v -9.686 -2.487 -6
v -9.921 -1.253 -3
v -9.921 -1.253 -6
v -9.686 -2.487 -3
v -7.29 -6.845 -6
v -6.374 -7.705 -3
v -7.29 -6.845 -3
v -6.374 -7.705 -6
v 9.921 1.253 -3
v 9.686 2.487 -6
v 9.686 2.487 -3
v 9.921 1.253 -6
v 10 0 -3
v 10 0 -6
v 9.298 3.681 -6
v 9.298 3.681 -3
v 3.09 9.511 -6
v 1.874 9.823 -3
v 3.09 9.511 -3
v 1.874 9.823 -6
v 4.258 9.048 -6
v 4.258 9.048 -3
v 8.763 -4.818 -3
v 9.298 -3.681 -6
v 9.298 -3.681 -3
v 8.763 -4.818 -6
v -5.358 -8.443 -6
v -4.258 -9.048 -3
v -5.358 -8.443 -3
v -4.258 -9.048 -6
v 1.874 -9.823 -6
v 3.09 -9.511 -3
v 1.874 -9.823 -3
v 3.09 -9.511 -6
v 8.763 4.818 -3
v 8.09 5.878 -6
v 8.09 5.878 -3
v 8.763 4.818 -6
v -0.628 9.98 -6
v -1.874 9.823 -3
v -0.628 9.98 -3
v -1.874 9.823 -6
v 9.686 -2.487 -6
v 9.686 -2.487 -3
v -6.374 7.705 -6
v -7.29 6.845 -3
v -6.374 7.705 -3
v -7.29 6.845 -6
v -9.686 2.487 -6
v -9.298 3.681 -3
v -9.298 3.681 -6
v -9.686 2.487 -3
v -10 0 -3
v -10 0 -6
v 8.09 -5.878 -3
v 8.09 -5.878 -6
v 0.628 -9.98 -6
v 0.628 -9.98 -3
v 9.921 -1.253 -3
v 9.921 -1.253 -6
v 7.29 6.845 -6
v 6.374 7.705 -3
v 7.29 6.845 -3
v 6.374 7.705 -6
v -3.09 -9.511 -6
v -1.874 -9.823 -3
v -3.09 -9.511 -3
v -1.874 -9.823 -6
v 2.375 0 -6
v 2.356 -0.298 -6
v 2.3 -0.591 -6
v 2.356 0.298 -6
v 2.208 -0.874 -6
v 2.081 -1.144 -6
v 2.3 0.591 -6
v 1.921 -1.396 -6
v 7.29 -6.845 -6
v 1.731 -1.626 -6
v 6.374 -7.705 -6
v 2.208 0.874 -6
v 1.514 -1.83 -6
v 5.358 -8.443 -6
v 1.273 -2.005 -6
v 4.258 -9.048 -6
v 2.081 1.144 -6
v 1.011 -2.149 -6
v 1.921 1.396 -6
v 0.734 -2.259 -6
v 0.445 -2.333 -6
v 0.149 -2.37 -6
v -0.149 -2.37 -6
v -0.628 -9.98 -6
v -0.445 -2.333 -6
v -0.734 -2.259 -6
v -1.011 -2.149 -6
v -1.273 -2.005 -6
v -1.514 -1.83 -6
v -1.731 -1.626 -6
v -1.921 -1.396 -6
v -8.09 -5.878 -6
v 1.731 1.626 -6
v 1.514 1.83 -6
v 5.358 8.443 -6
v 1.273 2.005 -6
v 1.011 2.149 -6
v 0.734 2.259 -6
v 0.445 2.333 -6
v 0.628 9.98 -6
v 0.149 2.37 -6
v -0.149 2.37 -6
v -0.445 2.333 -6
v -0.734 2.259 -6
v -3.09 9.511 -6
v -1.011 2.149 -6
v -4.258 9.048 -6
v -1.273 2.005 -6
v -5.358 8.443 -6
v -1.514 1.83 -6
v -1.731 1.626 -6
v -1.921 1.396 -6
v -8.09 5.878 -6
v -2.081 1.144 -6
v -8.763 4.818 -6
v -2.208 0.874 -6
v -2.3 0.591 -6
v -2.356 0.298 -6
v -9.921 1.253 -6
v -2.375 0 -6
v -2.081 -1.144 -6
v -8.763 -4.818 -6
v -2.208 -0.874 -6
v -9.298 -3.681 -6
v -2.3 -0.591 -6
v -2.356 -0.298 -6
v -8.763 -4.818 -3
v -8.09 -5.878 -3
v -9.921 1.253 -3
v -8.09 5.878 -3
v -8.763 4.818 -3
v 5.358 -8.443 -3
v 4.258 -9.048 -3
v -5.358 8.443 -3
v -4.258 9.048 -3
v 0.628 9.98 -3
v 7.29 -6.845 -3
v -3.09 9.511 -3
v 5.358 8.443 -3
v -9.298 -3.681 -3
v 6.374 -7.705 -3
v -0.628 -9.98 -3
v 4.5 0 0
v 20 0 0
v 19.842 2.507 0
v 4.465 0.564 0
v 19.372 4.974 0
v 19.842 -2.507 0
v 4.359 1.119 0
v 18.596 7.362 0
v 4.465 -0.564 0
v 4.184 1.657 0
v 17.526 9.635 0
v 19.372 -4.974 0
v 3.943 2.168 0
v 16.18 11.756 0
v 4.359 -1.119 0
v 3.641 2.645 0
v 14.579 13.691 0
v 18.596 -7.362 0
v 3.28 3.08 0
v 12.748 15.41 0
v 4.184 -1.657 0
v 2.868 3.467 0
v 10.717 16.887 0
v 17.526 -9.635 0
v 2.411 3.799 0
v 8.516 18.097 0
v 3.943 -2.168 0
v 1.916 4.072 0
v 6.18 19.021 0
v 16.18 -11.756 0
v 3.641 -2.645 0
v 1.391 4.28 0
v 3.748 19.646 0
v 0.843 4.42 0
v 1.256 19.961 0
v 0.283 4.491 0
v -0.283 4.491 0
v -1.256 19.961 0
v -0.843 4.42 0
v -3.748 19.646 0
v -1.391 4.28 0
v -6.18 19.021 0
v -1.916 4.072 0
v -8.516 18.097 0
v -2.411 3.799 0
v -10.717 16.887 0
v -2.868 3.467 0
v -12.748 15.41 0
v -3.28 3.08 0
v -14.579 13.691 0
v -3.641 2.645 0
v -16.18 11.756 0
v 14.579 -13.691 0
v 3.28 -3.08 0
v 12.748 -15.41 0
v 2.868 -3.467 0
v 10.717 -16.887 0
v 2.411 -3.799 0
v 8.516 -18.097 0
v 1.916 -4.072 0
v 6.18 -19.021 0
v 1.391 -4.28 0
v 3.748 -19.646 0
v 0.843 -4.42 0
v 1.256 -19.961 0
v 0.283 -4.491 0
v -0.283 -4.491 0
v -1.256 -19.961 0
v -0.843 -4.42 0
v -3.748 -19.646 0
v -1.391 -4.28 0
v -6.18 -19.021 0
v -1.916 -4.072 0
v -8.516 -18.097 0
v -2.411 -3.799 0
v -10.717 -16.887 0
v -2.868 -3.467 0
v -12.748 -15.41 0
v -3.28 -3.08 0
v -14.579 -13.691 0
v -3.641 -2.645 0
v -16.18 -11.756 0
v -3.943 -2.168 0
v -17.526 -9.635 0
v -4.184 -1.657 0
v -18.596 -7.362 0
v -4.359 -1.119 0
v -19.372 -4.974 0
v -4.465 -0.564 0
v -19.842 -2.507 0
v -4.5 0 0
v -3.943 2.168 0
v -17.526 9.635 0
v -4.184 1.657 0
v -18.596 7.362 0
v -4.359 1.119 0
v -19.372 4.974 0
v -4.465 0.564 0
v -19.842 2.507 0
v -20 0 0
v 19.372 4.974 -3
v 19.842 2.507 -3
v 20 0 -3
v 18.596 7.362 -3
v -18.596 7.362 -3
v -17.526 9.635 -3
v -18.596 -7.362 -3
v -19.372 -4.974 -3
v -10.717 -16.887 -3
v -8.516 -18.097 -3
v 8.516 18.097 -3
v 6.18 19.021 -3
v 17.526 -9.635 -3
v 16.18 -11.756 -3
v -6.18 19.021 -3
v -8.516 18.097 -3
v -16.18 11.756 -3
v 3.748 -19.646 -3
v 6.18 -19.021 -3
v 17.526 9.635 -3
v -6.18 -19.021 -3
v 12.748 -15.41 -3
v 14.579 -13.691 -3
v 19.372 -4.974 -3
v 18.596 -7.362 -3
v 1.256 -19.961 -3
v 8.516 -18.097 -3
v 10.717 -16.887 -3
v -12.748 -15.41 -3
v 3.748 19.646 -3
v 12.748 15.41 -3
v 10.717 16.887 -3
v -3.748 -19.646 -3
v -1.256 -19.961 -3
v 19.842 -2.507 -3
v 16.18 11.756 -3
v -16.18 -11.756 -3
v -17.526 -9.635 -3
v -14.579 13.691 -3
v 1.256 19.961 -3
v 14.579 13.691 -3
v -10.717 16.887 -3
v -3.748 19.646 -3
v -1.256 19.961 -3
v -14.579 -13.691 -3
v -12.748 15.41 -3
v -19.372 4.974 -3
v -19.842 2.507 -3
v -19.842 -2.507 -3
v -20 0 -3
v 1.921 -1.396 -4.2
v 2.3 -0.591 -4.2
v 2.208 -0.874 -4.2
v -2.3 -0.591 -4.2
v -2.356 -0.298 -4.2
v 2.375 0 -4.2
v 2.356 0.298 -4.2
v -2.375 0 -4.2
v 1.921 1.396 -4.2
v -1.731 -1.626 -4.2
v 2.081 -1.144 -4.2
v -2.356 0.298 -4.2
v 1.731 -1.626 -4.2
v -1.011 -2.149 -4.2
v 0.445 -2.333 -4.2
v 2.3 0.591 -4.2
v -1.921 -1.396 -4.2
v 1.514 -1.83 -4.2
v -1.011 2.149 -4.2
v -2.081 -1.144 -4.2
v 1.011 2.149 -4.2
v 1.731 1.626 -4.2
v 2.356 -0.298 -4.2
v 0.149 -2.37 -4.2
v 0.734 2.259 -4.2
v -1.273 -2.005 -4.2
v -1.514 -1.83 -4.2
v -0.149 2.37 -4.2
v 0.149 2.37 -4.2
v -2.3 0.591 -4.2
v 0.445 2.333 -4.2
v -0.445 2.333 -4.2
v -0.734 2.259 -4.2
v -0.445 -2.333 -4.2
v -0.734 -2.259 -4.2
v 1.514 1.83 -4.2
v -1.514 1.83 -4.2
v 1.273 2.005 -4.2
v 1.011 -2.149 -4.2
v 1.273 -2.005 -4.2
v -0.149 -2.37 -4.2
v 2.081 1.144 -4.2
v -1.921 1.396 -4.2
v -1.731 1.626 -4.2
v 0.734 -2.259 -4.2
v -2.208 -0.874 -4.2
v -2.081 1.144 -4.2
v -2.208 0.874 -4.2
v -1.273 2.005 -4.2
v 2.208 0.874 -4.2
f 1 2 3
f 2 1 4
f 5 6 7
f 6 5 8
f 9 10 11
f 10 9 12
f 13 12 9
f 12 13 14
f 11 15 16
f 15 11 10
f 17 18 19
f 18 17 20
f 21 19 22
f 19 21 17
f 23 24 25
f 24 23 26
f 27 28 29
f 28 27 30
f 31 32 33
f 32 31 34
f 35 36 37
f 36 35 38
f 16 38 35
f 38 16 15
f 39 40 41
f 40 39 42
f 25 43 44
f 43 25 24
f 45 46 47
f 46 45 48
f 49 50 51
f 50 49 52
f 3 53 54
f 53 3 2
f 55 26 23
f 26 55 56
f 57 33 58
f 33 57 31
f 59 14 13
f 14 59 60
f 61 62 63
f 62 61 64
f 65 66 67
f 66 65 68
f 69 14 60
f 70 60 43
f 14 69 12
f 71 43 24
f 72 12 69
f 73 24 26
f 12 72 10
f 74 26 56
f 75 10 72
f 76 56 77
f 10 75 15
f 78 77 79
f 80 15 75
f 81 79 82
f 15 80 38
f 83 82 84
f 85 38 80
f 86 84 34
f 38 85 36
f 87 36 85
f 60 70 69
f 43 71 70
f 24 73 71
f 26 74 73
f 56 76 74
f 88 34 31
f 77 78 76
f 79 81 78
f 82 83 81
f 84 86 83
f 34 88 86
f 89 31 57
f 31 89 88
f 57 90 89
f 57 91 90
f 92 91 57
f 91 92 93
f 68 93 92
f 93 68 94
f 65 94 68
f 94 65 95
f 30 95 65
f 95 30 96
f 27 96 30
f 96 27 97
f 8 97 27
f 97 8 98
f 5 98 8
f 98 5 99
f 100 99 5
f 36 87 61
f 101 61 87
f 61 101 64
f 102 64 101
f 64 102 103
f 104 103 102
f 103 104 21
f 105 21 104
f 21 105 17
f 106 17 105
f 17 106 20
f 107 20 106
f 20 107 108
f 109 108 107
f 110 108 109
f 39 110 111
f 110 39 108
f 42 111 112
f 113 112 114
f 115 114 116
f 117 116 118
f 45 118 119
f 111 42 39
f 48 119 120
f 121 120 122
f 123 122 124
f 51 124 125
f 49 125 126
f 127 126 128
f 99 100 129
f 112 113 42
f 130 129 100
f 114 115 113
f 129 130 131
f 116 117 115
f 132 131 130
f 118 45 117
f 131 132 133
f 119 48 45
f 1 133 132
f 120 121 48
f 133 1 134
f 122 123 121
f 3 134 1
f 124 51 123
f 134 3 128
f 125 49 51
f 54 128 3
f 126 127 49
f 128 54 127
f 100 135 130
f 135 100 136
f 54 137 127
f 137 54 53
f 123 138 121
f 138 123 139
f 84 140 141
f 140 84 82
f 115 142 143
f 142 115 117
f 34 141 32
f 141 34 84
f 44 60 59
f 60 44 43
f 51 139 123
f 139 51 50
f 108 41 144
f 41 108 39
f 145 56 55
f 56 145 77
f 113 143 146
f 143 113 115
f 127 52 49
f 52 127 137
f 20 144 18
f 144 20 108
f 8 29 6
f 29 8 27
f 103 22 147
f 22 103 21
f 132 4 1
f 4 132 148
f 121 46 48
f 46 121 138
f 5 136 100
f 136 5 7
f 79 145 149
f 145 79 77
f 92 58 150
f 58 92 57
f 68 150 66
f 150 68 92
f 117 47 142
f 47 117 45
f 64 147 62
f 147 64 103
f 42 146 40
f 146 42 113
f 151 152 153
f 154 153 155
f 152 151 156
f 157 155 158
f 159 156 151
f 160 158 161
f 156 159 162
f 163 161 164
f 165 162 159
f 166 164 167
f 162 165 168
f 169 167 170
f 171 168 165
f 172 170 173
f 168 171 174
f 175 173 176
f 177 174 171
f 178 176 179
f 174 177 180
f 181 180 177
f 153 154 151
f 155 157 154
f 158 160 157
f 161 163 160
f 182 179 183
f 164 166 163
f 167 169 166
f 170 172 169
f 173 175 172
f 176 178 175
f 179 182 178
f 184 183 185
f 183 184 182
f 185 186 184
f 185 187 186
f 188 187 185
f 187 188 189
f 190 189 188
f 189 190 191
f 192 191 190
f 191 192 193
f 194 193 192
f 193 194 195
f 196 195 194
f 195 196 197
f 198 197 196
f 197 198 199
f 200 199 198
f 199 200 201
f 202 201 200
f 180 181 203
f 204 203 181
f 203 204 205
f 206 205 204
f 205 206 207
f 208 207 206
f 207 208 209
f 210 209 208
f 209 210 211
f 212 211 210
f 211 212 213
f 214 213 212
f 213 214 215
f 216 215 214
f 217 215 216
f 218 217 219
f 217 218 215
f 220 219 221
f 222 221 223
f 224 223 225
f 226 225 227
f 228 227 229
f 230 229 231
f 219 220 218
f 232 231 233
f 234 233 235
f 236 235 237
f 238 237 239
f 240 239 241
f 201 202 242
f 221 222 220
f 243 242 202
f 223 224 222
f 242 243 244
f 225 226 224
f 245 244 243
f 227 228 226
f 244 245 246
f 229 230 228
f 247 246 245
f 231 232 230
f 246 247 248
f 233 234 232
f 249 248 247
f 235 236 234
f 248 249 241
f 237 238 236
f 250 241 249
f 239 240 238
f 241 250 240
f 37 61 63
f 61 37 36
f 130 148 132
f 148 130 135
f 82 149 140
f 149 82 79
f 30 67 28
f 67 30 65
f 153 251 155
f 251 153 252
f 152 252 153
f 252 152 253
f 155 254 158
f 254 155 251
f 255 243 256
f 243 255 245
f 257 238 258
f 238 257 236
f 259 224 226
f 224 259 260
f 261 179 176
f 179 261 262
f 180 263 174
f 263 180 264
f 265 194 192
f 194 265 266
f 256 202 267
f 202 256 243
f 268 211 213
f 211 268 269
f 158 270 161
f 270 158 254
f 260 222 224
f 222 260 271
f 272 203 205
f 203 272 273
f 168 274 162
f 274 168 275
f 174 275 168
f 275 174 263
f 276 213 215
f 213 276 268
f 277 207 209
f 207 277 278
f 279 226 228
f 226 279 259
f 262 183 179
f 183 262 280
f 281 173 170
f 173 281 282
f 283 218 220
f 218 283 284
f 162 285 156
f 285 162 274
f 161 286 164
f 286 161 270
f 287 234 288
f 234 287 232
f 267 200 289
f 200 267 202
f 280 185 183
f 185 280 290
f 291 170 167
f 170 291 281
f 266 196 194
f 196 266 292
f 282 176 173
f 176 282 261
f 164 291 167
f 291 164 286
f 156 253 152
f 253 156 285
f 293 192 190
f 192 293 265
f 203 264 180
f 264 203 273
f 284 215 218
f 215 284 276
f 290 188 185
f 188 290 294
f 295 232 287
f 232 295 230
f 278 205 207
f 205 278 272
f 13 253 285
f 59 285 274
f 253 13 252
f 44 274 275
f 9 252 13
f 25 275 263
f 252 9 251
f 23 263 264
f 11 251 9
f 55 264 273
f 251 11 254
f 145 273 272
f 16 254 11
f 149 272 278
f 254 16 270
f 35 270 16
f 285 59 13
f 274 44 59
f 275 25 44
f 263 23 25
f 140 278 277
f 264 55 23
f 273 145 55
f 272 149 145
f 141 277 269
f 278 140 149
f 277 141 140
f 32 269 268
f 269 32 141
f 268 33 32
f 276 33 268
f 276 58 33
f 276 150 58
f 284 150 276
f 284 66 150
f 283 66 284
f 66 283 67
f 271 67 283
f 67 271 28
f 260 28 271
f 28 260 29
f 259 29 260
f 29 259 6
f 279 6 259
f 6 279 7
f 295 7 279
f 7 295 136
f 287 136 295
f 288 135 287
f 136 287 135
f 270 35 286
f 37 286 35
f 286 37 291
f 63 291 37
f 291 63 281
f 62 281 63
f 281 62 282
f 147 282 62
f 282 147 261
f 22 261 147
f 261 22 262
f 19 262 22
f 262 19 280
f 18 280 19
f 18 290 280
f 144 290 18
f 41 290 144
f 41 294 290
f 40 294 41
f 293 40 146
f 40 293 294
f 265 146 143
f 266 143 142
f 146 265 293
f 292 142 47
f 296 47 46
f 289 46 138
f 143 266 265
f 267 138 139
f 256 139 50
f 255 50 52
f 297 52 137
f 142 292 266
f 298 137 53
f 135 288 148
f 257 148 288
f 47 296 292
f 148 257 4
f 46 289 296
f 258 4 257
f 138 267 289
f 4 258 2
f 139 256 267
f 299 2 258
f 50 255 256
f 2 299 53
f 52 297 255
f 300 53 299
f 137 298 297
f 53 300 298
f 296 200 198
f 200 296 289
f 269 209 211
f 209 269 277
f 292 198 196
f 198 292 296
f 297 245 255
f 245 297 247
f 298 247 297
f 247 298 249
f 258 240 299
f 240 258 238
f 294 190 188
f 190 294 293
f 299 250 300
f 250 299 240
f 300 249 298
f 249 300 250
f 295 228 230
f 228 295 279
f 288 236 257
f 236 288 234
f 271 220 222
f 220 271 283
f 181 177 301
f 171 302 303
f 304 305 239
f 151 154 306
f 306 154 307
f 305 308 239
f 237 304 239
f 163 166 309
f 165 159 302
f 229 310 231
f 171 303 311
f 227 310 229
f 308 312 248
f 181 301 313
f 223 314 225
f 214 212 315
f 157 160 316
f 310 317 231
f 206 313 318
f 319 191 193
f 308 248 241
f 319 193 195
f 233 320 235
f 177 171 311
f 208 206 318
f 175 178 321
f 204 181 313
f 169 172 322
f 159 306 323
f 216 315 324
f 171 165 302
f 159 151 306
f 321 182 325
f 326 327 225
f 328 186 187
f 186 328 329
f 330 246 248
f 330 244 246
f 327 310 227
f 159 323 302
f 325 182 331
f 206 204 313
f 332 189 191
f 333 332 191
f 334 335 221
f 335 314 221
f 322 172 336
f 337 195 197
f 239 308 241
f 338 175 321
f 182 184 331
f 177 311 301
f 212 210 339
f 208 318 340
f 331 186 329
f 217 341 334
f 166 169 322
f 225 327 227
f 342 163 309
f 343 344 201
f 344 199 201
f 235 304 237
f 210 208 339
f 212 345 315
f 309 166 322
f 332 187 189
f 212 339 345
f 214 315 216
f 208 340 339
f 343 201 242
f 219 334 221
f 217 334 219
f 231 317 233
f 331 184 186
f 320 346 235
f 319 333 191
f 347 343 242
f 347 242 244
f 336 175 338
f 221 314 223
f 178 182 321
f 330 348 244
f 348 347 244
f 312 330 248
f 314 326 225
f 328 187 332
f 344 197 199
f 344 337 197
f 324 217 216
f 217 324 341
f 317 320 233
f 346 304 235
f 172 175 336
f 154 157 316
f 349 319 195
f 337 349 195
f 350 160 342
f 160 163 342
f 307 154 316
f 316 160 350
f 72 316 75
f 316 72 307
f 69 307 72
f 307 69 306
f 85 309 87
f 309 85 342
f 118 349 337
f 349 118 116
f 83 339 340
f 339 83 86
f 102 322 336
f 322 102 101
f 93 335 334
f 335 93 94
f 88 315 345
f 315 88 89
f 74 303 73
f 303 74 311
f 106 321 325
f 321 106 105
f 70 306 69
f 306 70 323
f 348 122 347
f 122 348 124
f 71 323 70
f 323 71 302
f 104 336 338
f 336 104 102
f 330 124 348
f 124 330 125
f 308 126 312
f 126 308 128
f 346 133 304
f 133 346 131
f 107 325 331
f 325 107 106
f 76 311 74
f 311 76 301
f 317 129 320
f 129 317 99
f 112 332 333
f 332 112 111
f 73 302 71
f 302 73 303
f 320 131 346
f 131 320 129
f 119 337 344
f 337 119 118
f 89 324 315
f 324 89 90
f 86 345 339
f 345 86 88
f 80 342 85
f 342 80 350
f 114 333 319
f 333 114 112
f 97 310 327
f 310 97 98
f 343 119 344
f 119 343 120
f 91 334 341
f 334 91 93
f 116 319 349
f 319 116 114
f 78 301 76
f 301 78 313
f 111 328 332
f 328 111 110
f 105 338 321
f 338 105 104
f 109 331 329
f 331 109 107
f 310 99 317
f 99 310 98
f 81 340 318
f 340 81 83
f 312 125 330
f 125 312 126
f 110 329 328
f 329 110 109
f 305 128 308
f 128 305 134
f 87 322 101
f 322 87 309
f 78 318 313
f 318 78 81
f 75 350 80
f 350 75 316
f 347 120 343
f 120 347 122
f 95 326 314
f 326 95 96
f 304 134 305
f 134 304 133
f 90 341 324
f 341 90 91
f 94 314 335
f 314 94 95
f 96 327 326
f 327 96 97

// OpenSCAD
$fn = 50;


difference() {
	union() {
		translate(v = [0, 0, -6.0000000000]) {
			cylinder(h = 6, r = 10.0000000000);
		}
		translate(v = [0, 0, -3.0000000000]) {
			cylinder(h = 3, r = 20.0000000000);
		}
	}
	union() {
		translate(v = [0, 0, 0]) {
			rotate(a = [0, 0, 0]) {
				difference() {
					union() {
						#translate(v = [0, 0, -6.0000000000]) {
							cylinder(h = 6, r = 2.2500000000);
						}
						#translate(v = [0, 0, -4.2000000000]) {
							cylinder(h = 4.2000000000, r = 10.0000000000, r1 = 2.3750000000, r2 = 4.5000000000);
						}
						#translate(v = [0, 0, -6.0000000000]) {
							cylinder(h = 6, r = 2.3750000000);
						}
						#translate(v = [0, 0, -6.0000000000]) {
							cylinder(h = 6, r = 2.2500000000);
						}
					}
					union();
				}
			}
		}
	}
}
